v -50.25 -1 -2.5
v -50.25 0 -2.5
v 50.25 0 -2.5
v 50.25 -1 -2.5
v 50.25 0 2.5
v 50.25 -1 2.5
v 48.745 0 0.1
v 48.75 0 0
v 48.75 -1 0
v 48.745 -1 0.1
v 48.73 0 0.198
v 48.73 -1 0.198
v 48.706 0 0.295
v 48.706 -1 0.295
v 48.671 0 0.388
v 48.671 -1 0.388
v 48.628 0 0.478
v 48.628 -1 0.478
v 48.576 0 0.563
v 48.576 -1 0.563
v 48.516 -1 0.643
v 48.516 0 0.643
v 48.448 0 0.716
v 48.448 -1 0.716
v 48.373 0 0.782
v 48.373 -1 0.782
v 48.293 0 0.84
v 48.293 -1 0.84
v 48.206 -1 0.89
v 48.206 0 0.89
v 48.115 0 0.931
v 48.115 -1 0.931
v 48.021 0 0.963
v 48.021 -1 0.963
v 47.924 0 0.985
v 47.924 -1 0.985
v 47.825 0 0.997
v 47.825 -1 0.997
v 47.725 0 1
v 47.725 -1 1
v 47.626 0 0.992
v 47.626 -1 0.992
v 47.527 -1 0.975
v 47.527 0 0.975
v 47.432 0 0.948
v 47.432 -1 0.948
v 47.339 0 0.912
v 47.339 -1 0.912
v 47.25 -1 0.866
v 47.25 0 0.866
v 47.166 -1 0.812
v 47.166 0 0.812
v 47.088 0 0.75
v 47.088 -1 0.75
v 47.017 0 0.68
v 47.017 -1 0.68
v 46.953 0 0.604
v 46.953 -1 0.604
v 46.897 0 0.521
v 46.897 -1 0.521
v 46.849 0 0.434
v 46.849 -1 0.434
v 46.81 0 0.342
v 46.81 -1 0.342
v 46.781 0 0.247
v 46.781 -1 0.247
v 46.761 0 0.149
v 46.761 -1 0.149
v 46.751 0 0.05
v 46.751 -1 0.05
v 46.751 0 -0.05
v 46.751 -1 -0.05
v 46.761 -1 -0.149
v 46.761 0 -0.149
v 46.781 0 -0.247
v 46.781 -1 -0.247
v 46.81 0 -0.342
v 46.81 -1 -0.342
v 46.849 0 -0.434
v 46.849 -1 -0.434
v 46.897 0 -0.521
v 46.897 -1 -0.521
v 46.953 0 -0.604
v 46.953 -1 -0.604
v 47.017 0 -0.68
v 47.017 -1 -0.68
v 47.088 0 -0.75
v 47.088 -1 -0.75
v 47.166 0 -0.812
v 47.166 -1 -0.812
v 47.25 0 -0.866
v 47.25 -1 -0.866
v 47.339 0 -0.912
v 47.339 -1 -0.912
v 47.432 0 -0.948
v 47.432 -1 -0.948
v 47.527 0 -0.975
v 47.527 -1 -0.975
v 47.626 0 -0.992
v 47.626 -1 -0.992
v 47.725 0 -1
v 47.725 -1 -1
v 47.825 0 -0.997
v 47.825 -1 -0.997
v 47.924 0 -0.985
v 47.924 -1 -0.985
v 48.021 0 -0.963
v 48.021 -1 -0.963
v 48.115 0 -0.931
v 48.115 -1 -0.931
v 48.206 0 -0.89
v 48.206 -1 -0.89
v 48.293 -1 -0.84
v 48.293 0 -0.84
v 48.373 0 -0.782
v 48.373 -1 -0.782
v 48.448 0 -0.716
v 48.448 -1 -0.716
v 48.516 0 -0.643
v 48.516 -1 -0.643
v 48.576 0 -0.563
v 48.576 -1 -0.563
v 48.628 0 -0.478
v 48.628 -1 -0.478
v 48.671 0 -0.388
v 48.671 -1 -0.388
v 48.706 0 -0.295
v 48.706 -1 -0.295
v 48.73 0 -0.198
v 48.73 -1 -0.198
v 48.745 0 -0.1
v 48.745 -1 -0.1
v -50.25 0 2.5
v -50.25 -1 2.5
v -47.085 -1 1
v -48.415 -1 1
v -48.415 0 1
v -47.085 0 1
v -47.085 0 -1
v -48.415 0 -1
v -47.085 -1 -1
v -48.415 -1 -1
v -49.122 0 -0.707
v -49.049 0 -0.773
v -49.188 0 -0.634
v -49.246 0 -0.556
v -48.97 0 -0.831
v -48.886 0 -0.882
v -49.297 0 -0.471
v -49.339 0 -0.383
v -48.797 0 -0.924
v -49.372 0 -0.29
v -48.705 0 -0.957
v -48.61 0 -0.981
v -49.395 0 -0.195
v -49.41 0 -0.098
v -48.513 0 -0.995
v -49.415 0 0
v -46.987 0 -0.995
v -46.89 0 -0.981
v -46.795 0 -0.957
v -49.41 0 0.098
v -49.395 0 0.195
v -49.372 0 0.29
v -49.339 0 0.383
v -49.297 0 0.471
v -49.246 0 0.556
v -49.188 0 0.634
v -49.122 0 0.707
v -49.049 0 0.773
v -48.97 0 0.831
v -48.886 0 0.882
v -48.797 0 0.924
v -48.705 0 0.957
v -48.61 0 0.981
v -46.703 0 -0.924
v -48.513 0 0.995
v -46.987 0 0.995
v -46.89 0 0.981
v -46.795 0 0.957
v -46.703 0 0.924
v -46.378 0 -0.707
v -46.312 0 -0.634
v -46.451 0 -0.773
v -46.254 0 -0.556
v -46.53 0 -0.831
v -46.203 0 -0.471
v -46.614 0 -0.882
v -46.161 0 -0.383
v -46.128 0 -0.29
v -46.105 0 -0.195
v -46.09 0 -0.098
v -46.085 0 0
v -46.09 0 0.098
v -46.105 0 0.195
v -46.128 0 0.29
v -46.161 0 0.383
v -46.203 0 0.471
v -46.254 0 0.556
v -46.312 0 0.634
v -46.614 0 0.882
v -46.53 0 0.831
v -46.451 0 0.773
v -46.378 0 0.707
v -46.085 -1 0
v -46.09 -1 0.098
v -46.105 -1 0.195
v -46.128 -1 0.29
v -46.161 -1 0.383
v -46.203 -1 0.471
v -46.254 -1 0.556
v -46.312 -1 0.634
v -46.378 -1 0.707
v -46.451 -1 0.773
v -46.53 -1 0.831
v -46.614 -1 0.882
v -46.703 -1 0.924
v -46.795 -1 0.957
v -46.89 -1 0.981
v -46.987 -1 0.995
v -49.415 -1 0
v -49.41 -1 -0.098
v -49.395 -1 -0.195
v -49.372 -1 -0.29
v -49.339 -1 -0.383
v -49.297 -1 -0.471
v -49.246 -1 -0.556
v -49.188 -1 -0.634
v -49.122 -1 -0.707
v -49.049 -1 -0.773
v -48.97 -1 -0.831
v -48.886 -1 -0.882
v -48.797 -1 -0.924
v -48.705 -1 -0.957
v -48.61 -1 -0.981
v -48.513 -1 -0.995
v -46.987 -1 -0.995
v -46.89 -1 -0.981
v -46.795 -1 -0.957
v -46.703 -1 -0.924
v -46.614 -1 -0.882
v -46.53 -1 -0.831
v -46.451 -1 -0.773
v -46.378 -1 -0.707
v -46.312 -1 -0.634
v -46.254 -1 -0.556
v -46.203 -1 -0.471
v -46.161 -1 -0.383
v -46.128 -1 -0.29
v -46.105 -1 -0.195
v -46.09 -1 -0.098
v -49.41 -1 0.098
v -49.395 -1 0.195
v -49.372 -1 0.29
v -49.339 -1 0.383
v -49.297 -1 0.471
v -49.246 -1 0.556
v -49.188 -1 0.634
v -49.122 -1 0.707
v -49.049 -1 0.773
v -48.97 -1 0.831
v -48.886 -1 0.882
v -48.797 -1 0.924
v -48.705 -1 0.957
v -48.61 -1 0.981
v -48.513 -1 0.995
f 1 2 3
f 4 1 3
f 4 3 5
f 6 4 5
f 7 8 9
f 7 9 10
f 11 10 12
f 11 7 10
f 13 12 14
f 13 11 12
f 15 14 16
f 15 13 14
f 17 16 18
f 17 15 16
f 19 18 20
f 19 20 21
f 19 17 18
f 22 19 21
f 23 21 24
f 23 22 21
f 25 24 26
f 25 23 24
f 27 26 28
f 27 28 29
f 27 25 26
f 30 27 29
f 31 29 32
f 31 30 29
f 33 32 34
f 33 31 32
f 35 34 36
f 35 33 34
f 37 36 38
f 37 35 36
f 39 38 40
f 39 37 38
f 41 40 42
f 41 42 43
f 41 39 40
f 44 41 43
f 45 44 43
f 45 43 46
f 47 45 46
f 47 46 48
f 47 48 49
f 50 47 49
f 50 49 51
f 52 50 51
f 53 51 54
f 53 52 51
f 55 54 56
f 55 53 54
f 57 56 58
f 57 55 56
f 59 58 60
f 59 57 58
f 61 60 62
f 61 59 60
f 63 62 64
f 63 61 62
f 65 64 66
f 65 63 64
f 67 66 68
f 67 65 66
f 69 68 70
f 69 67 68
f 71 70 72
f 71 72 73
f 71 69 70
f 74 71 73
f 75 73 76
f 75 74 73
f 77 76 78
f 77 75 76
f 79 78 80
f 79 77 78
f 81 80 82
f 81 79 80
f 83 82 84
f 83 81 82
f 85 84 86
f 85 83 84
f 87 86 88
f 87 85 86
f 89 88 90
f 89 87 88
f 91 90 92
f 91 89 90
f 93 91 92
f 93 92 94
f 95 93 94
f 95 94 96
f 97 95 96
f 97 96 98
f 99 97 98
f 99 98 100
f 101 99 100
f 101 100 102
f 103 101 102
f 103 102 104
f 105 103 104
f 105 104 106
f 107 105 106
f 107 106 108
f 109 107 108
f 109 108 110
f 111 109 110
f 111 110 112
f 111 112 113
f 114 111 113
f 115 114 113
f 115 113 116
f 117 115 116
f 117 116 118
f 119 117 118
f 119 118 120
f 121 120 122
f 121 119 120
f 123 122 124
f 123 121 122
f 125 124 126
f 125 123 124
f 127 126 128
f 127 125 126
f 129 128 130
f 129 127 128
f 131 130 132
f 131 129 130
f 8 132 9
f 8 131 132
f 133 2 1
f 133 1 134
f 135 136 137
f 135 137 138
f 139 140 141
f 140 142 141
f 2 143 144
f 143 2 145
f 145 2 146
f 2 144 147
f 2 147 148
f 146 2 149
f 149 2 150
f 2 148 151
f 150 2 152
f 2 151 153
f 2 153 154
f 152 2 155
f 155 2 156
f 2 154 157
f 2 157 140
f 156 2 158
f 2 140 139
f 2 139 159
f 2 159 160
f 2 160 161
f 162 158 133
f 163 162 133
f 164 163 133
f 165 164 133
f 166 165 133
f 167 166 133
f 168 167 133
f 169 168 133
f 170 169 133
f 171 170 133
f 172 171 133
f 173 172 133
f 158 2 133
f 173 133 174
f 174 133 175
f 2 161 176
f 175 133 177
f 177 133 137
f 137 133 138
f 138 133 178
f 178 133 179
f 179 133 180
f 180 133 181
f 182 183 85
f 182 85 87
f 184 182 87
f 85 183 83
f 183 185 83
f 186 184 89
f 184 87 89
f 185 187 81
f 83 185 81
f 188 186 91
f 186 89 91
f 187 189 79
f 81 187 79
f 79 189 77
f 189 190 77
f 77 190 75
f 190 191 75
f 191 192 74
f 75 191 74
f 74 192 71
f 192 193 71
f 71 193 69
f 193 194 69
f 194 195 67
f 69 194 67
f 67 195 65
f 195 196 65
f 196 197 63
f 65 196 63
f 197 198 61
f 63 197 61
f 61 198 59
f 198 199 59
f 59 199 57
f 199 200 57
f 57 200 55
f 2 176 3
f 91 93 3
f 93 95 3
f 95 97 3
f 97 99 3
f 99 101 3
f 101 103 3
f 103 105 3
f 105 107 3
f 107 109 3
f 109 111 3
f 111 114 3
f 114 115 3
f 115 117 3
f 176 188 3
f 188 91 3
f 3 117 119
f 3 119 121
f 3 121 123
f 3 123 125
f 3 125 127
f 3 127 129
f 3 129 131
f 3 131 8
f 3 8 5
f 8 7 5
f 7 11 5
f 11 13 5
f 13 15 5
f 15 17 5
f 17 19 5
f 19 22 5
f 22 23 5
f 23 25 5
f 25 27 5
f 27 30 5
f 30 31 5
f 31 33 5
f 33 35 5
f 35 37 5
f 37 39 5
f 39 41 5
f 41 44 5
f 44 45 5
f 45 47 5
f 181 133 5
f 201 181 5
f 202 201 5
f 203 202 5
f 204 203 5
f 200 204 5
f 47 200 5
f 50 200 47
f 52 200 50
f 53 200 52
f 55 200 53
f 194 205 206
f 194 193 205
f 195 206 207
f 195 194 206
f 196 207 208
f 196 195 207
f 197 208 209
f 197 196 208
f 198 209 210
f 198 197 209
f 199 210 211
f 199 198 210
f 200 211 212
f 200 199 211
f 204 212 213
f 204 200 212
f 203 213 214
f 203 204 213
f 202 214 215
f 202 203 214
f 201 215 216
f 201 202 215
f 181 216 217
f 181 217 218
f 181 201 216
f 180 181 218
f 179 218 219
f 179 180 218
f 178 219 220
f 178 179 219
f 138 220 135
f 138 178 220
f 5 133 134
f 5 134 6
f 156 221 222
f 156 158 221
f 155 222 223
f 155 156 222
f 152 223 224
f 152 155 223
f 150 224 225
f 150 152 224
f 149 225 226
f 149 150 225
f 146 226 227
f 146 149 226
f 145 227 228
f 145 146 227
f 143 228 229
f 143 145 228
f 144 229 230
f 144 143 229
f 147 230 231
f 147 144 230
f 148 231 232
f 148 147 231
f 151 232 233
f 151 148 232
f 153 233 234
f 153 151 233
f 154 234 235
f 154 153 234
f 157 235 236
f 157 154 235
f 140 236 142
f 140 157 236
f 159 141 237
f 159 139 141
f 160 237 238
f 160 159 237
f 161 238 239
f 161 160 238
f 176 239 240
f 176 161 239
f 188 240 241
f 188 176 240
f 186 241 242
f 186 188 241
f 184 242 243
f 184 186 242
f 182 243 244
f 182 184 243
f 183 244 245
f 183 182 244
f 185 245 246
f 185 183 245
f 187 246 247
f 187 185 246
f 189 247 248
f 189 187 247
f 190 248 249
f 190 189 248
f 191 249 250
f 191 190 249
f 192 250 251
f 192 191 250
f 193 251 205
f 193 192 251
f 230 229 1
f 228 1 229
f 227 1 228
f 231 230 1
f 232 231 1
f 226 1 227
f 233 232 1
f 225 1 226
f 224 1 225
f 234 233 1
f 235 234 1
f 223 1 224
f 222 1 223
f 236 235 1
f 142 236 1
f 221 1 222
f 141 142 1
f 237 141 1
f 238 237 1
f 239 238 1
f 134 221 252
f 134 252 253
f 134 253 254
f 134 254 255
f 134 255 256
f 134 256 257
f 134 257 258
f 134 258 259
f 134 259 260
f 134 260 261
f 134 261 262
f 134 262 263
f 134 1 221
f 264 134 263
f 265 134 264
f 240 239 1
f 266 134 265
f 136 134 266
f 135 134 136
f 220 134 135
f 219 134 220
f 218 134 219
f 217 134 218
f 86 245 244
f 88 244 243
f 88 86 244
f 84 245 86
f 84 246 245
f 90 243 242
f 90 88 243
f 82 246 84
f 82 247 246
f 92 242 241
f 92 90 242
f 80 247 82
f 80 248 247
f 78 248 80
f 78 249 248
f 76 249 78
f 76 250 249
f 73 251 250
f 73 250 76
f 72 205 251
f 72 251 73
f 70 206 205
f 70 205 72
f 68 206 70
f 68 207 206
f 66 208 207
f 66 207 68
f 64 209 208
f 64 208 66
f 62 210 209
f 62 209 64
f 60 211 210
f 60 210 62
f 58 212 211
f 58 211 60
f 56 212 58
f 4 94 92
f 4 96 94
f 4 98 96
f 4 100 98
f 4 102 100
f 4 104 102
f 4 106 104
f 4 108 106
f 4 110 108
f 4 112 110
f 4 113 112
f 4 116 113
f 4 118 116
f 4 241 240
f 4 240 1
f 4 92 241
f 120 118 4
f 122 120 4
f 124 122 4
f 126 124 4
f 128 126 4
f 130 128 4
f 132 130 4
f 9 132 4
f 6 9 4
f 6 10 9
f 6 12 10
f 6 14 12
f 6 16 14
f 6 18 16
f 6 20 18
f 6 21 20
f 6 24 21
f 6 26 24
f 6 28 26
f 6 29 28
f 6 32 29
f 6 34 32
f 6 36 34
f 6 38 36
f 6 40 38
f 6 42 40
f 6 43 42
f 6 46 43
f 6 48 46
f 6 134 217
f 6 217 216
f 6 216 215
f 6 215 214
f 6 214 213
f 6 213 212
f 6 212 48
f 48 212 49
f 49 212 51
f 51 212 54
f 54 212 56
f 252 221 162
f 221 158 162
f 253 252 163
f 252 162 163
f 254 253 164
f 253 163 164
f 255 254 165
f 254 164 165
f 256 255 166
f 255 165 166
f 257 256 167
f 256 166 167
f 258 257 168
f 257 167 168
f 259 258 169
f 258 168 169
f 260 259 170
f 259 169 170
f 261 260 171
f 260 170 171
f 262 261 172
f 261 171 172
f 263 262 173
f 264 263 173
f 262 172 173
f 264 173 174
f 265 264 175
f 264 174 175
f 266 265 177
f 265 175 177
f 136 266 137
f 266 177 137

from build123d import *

# Parameters (mm, degrees)
F0_W     = 100.5
F0_H     = 5
F0_R     = 1
F1_DEPTH = 1
F2_W     = 3.3293967307
F2_H     = 2
F3_DEPTH = 25
F4_R     = 0.99999


# Not quite as in the source:
# - a fillet or chamfer is up to 0.001 mm smaller than in the source, because OpenCascade refuses the exact size


with BuildPart() as f1:
    # F0 (on Front) → F1 (new body)
    with BuildSketch(Plane.XZ):
        Rectangle(F0_W, F0_H)
        with Locations((-47.75, 0)):
            Circle(F0_R, mode=Mode.SUBTRACT)
        with Locations((47.75, 0)):
            Circle(F0_R, mode=Mode.SUBTRACT)
    extrude(amount=F1_DEPTH)

    # F2 (on face) → F3 (cut)
    with BuildSketch(Plane.XZ.offset(1)):
        with Locations((-47.75, 0)):
            Rectangle(F2_W, F2_H)
    extrude(amount=-F3_DEPTH, mode=Mode.SUBTRACT)

    # F4 (radius 1 in the source; OpenCascade refuses exactly that, so slightly less here)
    f4_edges = [f1.edges().sort_by_distance(p)[0] for p in [
        (-46.085302, -0.5, 1),
        (-46.085302, -0.5, -1),
        (-49.414698, -0.5, 1),
        (-49.414698, -0.5, -1),
    ]]
    fillet(f4_edges, radius=F4_R)


solid = f1.part
